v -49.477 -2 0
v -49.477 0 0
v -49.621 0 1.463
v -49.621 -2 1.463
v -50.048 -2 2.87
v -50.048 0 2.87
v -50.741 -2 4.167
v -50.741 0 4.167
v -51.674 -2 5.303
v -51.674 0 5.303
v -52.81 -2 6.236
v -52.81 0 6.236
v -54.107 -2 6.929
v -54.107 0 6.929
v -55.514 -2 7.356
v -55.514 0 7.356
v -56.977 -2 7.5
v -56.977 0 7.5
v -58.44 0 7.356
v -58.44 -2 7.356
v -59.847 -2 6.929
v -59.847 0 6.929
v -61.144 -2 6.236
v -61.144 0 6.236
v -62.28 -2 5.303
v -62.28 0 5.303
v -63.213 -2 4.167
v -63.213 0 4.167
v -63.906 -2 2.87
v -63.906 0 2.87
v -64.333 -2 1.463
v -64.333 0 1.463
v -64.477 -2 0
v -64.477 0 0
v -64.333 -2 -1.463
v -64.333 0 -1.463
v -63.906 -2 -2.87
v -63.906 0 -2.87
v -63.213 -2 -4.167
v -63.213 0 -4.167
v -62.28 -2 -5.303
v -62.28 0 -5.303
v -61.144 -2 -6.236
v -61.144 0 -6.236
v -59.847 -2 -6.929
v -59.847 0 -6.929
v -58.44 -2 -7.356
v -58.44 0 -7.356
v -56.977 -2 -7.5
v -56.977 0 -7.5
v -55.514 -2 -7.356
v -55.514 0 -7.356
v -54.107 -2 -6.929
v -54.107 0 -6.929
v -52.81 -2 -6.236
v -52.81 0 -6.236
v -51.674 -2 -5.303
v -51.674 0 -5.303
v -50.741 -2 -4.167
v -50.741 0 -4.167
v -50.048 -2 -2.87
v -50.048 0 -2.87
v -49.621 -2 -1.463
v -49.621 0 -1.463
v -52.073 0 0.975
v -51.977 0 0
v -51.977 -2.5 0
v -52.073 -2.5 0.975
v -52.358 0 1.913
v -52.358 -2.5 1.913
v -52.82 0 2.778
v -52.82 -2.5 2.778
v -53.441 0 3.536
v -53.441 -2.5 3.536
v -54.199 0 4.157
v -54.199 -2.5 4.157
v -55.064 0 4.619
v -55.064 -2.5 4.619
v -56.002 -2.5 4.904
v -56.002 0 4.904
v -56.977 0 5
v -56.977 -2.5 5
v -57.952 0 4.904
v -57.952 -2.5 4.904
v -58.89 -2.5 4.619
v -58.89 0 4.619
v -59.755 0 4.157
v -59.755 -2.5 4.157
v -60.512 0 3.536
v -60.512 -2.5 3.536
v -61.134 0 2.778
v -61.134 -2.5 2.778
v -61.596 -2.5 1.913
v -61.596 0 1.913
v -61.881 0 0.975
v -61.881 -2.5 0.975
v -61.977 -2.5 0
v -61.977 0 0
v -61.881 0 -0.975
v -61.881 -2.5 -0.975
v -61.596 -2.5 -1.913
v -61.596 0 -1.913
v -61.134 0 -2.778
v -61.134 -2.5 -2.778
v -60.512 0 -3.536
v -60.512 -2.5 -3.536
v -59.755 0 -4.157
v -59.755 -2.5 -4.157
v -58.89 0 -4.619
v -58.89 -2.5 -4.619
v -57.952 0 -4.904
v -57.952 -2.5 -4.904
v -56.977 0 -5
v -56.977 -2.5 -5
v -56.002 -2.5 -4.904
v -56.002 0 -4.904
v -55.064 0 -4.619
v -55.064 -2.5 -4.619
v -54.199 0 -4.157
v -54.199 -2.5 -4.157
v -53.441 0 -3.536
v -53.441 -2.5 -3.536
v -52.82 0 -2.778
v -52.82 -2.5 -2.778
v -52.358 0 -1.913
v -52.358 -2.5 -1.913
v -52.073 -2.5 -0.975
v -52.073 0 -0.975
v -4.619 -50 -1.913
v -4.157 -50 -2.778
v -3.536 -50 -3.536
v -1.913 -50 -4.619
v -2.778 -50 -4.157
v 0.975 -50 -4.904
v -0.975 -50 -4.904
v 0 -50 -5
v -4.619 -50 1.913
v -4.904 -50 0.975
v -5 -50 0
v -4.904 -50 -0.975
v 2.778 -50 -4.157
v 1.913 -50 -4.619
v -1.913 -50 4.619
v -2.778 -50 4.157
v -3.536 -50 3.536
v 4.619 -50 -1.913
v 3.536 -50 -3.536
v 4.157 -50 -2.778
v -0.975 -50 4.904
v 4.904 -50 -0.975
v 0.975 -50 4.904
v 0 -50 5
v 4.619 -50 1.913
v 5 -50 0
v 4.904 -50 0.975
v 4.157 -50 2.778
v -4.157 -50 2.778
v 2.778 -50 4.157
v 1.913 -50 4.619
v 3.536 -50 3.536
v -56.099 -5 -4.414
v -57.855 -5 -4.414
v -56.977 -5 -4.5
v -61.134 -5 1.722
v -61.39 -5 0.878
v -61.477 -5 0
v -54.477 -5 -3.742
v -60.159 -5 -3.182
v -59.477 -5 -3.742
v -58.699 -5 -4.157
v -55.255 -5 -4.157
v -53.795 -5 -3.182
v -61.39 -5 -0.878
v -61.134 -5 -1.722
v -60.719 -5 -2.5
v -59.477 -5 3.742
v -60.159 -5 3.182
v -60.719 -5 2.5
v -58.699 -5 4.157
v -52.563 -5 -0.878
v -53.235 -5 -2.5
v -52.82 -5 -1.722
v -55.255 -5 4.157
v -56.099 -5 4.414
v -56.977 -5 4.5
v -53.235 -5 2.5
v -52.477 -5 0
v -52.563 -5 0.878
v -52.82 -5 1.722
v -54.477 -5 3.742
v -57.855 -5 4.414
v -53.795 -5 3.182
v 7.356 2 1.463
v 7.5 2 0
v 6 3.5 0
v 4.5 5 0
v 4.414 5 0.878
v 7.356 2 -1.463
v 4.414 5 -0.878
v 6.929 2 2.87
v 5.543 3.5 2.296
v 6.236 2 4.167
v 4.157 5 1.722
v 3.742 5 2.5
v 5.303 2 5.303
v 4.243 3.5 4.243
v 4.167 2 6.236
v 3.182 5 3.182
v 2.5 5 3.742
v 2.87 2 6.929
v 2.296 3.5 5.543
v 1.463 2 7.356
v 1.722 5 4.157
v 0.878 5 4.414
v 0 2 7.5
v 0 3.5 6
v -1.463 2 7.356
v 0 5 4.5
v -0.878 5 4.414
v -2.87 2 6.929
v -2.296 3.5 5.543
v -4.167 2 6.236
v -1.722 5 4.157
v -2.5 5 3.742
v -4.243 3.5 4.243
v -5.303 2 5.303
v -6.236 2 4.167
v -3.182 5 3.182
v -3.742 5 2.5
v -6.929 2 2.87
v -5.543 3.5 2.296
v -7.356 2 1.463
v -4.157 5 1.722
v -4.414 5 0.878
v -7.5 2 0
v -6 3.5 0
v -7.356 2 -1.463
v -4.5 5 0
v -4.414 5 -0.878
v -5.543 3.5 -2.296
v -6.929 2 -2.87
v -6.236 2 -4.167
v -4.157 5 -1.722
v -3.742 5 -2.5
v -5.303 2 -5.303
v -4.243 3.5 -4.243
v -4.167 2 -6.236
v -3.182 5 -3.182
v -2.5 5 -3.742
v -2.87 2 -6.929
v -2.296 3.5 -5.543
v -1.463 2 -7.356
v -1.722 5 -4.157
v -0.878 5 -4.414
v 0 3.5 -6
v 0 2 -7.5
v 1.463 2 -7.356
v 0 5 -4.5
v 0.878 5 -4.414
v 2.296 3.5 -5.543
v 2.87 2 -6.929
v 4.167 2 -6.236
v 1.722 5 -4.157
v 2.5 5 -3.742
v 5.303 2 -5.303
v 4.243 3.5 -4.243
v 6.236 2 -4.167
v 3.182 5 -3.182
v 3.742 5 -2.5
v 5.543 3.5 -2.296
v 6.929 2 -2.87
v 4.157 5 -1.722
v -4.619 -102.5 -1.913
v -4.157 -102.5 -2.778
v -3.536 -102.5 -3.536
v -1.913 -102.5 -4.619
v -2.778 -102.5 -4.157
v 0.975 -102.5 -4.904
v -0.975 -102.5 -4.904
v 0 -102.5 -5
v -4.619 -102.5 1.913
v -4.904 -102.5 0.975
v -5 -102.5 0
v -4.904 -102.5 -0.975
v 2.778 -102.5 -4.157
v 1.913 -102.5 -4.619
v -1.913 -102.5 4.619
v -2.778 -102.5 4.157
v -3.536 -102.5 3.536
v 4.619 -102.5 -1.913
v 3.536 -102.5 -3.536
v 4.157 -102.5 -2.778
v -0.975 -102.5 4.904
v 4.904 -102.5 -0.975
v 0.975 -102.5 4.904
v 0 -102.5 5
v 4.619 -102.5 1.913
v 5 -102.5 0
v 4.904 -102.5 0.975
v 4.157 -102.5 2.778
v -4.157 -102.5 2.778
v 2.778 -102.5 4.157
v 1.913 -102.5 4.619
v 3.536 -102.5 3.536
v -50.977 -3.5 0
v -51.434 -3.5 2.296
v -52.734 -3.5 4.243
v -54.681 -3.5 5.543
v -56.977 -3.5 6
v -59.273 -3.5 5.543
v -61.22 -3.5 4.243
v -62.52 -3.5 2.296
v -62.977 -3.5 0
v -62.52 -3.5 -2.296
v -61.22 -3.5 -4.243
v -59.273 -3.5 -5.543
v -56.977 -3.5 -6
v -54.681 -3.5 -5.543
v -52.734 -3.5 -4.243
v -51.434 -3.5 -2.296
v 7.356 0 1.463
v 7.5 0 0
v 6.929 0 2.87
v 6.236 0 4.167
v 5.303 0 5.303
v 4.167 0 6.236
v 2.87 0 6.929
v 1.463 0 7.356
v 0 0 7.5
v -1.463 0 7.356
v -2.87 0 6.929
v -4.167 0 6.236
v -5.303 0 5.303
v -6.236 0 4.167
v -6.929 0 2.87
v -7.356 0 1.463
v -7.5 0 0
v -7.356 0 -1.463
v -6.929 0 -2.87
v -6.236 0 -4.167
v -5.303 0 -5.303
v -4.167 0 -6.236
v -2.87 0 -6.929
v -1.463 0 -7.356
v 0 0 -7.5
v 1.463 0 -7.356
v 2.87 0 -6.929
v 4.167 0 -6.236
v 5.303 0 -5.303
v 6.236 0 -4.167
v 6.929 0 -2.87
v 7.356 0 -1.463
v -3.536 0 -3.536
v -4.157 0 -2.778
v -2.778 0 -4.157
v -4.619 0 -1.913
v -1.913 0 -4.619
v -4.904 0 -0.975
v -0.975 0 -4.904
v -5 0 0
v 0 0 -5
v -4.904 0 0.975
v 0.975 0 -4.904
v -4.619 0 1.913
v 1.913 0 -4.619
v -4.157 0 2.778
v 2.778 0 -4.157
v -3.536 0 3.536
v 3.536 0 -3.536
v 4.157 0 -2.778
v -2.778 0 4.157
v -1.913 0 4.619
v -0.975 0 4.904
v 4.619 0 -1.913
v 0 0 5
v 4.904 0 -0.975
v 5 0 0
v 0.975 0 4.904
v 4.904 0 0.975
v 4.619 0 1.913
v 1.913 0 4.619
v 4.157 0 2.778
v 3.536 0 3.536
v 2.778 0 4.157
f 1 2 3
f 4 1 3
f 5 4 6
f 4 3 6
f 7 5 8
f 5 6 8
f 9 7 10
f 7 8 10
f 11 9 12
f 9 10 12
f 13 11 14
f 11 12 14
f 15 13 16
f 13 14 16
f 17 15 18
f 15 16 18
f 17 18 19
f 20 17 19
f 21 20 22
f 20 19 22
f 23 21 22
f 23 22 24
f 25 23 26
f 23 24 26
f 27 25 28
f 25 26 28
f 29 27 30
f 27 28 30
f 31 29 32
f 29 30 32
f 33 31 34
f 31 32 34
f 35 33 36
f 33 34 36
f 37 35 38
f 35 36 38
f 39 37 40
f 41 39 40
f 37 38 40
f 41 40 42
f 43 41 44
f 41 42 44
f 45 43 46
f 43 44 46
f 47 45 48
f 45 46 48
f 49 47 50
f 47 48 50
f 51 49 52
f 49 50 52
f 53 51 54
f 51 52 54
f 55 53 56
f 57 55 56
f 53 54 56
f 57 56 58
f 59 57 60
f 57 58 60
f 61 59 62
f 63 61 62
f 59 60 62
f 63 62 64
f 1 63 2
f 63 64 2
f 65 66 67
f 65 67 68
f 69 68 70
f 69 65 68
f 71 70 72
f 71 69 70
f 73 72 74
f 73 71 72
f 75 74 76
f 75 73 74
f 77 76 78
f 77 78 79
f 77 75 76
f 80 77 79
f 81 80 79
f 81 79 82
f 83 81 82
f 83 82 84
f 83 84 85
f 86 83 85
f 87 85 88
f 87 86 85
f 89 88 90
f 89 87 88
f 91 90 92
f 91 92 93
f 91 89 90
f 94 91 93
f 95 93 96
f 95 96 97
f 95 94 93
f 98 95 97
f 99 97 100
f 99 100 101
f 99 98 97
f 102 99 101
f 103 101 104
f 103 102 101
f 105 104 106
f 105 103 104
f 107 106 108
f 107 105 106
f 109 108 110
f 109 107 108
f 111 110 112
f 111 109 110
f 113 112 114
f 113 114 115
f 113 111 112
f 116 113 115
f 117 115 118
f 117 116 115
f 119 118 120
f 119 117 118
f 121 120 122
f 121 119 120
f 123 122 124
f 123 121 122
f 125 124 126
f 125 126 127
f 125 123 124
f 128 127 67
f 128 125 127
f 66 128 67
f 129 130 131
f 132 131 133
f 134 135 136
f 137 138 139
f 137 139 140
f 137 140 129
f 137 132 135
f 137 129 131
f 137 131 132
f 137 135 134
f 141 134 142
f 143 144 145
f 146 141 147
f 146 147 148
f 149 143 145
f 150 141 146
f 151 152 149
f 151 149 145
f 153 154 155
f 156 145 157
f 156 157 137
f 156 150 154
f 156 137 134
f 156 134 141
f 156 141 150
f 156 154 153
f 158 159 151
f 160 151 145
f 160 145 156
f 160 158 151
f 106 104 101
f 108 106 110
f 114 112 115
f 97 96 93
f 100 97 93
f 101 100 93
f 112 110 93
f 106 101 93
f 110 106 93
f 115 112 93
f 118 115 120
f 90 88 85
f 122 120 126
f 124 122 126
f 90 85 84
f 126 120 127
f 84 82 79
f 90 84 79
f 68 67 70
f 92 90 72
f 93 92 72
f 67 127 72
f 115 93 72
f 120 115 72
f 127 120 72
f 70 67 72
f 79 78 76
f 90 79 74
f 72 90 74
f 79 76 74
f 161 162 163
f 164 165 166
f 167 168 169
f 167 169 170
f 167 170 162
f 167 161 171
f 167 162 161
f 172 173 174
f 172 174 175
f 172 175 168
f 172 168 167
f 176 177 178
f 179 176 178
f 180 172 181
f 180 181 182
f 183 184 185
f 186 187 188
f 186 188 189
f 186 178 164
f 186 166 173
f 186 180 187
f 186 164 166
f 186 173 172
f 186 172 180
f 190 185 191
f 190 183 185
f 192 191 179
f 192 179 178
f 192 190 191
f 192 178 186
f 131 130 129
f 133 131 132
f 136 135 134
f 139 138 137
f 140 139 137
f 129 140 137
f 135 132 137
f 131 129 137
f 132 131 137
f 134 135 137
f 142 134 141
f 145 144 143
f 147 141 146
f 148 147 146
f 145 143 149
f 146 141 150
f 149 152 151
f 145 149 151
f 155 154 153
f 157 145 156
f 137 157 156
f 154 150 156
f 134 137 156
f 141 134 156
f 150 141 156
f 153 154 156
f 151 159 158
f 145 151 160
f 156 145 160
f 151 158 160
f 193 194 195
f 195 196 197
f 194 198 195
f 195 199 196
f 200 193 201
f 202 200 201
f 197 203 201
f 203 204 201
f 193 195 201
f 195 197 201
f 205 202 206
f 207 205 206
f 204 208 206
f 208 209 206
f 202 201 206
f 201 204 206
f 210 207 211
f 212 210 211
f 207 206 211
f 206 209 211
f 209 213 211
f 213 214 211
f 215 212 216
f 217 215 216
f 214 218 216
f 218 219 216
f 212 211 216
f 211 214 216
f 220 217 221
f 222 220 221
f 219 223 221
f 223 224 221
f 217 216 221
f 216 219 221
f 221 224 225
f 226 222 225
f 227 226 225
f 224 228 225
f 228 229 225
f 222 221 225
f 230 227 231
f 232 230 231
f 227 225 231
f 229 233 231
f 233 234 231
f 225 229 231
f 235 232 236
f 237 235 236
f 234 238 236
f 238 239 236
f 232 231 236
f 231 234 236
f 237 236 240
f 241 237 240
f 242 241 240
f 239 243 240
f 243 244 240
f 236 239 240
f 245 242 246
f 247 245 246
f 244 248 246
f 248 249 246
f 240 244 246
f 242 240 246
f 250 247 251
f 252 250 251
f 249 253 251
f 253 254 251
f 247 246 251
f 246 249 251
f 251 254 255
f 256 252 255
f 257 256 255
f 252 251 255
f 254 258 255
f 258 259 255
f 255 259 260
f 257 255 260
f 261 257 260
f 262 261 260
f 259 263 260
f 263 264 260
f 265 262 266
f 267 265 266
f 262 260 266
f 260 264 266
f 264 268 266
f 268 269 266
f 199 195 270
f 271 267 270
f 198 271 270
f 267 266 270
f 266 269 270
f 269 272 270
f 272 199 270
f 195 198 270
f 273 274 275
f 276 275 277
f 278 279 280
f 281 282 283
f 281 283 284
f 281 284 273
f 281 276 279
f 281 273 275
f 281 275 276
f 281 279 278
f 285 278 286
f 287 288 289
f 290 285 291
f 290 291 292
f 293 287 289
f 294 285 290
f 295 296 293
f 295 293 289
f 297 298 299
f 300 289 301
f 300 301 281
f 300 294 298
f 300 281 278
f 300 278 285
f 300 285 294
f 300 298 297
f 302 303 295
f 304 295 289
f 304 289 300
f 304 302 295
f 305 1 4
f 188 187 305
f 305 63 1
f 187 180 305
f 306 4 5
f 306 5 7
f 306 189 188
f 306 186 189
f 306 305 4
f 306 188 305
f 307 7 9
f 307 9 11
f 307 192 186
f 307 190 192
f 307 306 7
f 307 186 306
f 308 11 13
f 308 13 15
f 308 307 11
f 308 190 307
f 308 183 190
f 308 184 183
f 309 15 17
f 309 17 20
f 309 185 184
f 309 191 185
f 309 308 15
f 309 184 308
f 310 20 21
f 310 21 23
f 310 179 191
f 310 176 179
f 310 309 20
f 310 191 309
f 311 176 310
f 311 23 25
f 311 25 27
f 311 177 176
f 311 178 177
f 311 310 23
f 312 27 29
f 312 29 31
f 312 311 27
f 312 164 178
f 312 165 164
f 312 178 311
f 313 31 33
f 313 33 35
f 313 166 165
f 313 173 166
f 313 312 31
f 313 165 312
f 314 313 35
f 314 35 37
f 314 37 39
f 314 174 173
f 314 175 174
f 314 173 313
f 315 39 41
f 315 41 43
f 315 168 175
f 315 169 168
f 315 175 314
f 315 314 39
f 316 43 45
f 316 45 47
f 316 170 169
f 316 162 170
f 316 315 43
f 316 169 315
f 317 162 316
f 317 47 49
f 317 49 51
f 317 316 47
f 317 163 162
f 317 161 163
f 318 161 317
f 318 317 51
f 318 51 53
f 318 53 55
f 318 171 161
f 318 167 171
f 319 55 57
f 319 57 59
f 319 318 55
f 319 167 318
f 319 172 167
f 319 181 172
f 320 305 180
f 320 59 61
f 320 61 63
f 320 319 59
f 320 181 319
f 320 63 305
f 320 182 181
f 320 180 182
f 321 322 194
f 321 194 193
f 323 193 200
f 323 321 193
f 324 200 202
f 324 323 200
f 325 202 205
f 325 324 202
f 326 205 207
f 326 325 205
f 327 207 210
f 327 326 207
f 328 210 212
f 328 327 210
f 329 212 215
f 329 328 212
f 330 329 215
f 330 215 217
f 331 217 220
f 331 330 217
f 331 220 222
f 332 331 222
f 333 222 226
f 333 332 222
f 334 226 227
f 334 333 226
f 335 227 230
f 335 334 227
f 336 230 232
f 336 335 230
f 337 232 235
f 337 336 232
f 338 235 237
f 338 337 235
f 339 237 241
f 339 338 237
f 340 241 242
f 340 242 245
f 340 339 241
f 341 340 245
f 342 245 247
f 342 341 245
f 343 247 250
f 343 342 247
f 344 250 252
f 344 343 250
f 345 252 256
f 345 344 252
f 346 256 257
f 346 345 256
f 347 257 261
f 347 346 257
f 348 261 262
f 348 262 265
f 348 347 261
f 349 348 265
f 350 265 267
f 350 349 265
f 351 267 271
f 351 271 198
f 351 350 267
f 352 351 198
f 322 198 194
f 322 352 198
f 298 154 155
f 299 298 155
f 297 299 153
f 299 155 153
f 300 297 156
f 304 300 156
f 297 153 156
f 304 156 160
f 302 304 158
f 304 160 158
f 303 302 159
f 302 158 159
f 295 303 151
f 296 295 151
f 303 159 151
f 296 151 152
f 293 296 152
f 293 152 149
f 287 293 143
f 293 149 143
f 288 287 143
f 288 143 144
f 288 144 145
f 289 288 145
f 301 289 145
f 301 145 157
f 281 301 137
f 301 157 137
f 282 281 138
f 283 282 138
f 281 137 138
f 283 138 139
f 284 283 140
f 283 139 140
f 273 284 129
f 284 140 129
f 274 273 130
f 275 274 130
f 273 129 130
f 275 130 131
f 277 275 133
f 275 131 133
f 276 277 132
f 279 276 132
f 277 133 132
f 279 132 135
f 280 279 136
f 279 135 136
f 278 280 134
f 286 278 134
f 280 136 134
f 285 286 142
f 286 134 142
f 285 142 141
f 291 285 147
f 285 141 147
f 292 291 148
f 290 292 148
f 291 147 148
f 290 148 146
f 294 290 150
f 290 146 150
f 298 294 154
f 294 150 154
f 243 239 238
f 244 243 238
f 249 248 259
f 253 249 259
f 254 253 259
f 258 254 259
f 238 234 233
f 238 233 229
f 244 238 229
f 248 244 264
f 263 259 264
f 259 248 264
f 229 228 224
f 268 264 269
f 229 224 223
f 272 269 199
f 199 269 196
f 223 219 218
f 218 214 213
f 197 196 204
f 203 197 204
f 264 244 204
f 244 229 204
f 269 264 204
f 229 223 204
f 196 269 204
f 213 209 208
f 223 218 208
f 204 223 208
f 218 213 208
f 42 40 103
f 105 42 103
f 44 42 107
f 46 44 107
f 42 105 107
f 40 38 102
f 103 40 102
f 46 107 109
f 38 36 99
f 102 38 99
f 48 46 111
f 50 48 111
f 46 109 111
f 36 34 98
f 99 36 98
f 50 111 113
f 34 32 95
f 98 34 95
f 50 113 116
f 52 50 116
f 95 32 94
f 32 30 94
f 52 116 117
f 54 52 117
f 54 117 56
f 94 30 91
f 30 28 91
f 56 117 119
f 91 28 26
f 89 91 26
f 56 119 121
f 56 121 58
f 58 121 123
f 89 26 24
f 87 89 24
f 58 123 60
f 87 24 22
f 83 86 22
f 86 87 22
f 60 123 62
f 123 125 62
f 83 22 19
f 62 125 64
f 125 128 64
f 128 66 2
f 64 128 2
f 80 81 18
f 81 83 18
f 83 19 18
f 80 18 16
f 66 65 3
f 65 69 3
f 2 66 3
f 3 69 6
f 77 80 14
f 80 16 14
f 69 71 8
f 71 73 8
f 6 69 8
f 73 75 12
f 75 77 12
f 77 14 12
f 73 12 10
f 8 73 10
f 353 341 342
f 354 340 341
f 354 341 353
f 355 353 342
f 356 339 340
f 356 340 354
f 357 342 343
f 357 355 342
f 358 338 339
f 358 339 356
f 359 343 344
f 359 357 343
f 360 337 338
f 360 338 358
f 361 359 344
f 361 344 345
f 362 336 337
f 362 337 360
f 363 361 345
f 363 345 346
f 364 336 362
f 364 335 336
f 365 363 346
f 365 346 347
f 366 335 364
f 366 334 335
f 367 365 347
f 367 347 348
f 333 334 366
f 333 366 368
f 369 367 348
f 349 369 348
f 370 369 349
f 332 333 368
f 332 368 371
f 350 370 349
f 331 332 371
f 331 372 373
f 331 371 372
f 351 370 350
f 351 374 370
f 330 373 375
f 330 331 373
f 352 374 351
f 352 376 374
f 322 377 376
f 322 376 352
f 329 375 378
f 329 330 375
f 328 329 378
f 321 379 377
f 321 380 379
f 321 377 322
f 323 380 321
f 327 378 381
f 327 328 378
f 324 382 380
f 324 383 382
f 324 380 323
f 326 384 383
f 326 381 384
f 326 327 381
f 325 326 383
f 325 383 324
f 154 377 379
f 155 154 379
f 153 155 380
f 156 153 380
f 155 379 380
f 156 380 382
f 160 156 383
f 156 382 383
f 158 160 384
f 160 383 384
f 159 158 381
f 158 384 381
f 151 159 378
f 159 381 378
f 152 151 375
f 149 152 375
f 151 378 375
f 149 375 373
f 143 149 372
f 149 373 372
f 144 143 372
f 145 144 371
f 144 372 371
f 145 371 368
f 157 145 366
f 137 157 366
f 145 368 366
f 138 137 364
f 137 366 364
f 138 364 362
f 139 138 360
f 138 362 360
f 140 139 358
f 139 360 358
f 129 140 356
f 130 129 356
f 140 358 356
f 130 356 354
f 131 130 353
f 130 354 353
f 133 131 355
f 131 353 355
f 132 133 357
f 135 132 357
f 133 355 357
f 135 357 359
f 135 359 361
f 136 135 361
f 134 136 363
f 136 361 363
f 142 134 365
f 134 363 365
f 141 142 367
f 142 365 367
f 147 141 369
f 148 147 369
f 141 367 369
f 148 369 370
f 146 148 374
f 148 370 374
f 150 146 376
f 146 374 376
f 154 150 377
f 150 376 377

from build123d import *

# Parameters (mm, degrees)
F0_R     = 7.5
F0_R_2   = 5
F1_DEPTH = 5
F2_DEPTH = 50
F3_R     = 5
F4_DEPTH = 52.5
F5_DEPTH = 5
F6_DEPTH = 2.5
F7_SIZE  = 3
F8_SIZE  = 3


with BuildPart() as f1:
    # F0 (on Front) → F1 (new body)
    with BuildSketch(Plane.XZ):
        Circle(F0_R)
        Circle(F0_R_2, mode=Mode.SUBTRACT)
        Circle(F0_R_2)
    extrude(amount=-F1_DEPTH)

    # F0 (on Front) → F2 (join)
    with BuildSketch(Plane.XZ):
        Circle(F0_R_2)
    extrude(amount=F2_DEPTH)

    # F7
    f7_edges = [f1.edges().sort_by_distance(p)[0] for p in [
        (-7.5, 5, 0),
    ]]
    chamfer(f7_edges, length=F7_SIZE)


with BuildPart() as f4:
    # F3 (on face) → F4 (new body)
    with BuildSketch(Plane.XZ.offset(50)):
        Circle(F3_R)
    extrude(amount=F4_DEPTH)


with BuildPart() as f5:
    # F0 (on Front) → F5 (new body)
    with BuildSketch(Plane.XZ):
        with Locations((-56.9769628346, 0)):
            Circle(F0_R)
        with Locations((-56.9769628346, 0)):
            Circle(F0_R_2, mode=Mode.SUBTRACT)
        with Locations((-56.9769628346, 0)):
            Circle(F0_R_2)
    extrude(amount=F5_DEPTH)

    # F0 (on Front) → F6 (cut)
    with BuildSketch(Plane.XZ):
        with Locations((-56.9769628346, 0)):
            Circle(F0_R_2)
    extrude(amount=F6_DEPTH, mode=Mode.SUBTRACT)

    # F8
    f8_edges = [f5.edges().sort_by_distance(p)[0] for p in [
        (-64.476963, -5, 0),
    ]]
    chamfer(f8_edges, length=F8_SIZE)


solid = Compound([f1.part, f4.part, f5.part])
